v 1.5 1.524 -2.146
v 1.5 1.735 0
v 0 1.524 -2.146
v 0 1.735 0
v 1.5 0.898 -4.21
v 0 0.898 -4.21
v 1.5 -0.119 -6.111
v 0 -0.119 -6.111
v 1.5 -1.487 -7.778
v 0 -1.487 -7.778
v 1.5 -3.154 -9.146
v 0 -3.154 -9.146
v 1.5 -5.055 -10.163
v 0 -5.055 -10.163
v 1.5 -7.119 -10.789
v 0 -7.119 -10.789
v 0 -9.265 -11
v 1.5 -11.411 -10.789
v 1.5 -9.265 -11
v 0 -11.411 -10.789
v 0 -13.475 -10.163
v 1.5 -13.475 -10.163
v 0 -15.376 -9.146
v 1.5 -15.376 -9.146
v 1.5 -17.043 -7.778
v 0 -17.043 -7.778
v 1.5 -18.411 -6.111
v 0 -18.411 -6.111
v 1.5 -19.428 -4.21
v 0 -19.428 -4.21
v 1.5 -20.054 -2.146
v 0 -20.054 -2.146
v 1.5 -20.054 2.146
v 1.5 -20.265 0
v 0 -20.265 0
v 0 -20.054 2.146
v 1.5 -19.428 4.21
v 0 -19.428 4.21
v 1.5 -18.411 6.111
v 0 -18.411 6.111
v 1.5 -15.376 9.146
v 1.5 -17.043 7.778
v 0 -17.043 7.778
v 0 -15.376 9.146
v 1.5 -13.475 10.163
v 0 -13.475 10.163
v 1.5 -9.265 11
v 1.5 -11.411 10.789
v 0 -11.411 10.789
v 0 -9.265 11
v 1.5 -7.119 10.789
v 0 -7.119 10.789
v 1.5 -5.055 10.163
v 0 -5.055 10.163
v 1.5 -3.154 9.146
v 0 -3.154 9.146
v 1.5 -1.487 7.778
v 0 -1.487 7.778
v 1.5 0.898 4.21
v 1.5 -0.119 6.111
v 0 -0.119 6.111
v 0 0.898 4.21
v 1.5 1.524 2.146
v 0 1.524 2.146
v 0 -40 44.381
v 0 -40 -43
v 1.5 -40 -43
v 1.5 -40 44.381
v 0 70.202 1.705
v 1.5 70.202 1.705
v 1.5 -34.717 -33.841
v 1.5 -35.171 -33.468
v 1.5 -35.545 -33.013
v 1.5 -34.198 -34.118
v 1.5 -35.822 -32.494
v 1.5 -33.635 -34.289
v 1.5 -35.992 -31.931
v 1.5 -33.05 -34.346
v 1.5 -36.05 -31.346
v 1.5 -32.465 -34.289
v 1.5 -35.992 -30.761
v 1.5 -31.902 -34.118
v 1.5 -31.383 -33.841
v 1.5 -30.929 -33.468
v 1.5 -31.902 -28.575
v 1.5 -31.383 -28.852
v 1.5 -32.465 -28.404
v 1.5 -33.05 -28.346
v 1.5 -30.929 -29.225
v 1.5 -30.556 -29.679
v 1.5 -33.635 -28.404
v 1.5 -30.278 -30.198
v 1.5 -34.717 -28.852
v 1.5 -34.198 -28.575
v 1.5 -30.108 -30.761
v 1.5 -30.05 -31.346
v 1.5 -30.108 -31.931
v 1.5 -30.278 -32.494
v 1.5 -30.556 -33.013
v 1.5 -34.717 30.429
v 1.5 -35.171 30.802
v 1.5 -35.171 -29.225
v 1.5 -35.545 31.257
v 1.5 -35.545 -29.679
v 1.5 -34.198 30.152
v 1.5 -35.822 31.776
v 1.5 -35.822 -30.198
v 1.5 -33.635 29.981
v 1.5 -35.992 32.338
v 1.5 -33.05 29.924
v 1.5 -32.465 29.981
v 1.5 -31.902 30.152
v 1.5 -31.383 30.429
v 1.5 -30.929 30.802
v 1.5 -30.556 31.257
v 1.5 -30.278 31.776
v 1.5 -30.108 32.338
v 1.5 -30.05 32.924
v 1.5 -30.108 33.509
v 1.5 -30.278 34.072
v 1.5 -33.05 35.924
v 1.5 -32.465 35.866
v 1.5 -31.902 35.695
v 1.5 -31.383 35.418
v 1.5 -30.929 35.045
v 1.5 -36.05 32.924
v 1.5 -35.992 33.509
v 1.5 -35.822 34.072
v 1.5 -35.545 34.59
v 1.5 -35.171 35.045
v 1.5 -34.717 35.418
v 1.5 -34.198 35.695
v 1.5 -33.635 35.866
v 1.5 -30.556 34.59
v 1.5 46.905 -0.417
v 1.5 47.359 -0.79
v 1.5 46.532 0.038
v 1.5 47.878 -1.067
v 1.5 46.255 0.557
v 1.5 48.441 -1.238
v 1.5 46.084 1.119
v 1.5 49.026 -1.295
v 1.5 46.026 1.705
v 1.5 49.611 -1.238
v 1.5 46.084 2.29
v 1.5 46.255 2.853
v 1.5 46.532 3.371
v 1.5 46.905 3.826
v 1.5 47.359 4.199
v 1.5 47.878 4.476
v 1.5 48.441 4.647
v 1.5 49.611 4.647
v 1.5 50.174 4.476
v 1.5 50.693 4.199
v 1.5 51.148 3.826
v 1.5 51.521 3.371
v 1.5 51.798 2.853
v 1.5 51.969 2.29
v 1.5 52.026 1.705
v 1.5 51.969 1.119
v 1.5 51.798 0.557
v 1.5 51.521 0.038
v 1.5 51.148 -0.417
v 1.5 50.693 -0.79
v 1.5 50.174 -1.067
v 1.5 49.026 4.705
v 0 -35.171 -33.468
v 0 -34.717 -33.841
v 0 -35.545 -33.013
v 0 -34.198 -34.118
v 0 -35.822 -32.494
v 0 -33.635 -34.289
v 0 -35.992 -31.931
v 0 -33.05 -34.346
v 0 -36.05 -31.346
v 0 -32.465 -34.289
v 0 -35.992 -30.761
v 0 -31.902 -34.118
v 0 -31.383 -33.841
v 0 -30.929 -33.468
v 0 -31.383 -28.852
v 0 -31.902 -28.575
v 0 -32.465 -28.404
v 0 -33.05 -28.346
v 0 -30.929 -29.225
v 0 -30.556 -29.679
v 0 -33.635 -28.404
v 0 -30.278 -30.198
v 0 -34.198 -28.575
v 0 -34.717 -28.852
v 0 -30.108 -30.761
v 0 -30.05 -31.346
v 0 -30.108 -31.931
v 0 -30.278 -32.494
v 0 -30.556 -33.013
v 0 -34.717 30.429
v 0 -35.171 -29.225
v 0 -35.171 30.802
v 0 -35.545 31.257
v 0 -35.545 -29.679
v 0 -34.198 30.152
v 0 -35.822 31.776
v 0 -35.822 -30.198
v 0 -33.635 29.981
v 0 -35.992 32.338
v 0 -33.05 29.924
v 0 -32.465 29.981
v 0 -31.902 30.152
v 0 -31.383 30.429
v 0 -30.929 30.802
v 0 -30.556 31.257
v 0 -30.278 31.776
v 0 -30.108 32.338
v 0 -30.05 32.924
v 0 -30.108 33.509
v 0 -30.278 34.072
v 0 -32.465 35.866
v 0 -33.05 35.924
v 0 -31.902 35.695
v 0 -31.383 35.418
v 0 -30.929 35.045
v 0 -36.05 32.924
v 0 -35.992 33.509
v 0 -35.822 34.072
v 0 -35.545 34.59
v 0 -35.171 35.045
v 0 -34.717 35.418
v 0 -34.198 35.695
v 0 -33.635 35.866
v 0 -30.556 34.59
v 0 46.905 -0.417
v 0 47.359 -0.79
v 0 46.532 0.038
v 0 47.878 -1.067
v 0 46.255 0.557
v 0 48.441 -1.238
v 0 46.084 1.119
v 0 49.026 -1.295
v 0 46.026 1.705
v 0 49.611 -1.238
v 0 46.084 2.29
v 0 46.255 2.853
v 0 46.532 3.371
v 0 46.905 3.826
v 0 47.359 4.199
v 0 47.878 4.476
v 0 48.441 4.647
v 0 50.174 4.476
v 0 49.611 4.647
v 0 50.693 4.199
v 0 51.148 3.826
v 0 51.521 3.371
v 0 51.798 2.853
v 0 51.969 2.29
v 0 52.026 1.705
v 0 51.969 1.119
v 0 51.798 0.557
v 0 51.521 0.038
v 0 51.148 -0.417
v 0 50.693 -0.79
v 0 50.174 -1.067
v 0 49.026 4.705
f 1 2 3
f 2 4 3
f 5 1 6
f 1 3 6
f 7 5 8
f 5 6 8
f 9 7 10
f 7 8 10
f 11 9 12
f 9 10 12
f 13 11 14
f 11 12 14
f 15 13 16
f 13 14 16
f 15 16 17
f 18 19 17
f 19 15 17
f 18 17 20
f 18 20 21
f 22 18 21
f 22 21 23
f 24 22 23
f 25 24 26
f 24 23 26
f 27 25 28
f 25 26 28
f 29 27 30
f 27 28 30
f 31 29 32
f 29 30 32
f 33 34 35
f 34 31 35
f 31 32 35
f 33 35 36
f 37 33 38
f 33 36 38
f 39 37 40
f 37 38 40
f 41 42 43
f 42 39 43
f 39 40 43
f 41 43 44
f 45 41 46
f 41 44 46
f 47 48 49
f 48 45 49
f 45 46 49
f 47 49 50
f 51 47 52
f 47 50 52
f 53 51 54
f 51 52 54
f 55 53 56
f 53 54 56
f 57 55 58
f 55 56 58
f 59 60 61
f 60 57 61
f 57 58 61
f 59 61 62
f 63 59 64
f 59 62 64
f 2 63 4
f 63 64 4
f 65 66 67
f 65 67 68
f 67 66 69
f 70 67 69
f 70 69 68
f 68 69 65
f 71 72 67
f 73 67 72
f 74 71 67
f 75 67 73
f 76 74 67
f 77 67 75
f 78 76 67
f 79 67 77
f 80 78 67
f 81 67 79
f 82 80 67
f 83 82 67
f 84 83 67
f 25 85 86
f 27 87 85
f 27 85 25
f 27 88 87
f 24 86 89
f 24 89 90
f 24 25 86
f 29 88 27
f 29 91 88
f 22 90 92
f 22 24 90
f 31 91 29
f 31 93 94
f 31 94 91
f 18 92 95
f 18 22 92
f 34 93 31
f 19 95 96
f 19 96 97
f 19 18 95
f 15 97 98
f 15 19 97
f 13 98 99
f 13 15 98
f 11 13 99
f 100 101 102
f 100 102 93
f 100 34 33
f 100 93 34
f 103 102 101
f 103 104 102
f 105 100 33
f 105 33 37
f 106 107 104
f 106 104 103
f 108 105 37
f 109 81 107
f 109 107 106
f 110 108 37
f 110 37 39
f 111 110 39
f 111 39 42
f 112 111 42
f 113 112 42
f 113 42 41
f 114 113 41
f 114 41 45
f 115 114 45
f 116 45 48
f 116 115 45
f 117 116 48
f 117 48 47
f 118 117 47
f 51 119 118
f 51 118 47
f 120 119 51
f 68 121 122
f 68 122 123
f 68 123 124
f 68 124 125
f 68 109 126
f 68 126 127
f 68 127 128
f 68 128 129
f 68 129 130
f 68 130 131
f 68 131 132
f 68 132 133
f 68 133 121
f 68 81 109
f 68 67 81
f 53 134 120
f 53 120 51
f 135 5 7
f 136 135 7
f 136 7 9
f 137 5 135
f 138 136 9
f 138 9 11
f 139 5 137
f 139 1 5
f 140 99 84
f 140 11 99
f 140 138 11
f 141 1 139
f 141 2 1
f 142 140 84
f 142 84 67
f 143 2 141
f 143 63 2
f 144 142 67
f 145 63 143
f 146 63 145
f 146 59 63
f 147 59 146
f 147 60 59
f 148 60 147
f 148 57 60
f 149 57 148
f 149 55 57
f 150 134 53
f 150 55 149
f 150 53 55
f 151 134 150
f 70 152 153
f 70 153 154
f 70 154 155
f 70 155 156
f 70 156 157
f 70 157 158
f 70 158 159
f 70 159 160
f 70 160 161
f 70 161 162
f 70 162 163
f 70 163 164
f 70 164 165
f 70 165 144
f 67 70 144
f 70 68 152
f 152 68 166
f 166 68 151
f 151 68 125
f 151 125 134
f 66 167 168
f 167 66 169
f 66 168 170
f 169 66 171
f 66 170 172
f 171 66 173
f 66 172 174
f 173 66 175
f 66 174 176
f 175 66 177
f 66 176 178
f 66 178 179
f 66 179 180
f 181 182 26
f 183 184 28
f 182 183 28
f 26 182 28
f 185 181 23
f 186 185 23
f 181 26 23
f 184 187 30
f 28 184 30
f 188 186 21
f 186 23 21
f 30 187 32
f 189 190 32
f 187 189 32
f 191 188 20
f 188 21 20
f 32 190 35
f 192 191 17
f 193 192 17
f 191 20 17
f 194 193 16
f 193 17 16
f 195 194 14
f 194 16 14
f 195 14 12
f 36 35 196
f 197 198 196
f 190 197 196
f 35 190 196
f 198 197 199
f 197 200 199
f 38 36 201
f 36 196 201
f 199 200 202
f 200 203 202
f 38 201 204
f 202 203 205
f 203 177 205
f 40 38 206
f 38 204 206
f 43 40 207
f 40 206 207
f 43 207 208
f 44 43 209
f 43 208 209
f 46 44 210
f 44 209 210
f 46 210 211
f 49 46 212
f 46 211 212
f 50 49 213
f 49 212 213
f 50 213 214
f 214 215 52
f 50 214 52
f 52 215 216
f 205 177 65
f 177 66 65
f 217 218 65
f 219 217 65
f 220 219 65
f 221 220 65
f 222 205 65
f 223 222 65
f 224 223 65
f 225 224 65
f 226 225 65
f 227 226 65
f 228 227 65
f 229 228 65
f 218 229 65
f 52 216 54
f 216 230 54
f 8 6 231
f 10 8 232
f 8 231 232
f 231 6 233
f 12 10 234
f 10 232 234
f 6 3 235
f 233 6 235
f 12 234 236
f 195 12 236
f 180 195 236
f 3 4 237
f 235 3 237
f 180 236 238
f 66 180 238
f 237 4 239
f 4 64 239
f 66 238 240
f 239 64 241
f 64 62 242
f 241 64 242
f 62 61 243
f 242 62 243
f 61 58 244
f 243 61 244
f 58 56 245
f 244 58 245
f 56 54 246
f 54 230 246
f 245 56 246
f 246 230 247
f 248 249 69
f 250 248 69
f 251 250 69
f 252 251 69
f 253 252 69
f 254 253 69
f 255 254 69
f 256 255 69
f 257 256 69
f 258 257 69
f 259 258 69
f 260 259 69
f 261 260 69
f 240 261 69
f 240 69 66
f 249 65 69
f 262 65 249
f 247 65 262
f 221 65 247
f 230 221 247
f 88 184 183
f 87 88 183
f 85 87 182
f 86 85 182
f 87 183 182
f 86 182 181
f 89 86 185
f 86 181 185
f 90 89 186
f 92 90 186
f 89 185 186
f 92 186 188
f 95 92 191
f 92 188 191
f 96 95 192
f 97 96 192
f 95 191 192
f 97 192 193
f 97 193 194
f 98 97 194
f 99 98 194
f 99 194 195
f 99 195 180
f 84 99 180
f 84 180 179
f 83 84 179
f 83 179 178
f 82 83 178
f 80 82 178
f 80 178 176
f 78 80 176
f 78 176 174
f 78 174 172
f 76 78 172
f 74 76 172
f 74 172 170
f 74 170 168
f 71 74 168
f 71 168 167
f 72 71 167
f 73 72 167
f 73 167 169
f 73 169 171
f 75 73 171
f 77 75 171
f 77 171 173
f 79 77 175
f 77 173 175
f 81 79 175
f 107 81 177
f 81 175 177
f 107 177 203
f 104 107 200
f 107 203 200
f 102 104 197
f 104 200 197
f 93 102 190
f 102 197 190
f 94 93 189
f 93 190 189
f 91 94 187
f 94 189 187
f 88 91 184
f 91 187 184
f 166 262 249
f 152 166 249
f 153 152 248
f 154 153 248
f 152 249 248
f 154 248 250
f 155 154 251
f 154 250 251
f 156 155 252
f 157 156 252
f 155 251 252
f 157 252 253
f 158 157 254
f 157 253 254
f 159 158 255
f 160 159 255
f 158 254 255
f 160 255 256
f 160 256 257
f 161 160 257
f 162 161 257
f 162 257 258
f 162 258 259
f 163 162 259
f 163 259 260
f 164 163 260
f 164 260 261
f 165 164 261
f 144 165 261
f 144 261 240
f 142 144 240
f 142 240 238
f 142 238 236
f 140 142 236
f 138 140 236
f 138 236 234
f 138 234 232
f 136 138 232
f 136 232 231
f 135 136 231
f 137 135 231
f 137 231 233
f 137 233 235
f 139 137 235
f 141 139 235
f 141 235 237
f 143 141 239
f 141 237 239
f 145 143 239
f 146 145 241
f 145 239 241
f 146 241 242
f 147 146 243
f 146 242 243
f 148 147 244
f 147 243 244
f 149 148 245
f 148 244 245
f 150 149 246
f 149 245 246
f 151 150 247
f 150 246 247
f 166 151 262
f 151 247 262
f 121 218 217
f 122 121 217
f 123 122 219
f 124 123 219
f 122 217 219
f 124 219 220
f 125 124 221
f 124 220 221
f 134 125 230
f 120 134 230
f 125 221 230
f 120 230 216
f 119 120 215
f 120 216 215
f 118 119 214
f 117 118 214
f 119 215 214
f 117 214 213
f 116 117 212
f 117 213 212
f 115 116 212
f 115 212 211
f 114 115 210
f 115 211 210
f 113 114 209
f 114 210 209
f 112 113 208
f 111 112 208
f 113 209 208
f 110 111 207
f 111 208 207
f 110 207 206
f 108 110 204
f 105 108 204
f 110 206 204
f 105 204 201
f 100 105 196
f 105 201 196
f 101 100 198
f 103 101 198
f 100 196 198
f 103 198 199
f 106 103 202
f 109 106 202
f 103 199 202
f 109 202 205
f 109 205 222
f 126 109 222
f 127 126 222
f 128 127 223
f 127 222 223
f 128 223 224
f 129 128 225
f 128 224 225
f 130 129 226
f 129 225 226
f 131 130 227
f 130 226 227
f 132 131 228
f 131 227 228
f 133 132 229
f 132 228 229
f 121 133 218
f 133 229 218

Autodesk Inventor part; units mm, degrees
ref_plane "YZ Plane" through (0, 0, 0) normal (1, 0, 0) x (0, 1, 0)
ref_plane "XZ Plane" through (0, 0, 0) normal (0, 1, 0) x (-1, 0, 0)
ref_plane "XY Plane" through (0, 0, 0) normal (0, 0, 1) x (1, 0, 0)
sketch "Esboço1" plane through (0, 0, 0) normal (1, 0, 0) x (0, 1, 0)
  line L0 (0, 0) -> (0, 43) construction
  line L1 (0, 0) -> (0, -43) construction
  line L2 (0, 0) -> (-40, 0) construction
  line L3 (-40, -43) -> (-40, 44.381)
  line L4 (-40, 0) -> (66, 0) construction
  line L5 (-40, -43) -> (70.202, 1.7046)
  line L6 (70.202, 1.7046) -> (-40, 44.381)
  circle A0 centre (-9.265, 0) radius 11
  line L7 (-326.6157, 155.3746) -> (103.2483, -11.0928)
  dimension "d1" = 43
  dimension "d2" = 43
  dimension "d3" = 40
  dimension "d4" = 106
  dimension "d5" = 22
extrude "Extrusão1" add sketch "Esboço1" along normal blind 1.5
sketch "Esboço2" plane through (0, 0, 0) normal (-1, 0, 0) x (0, 0, 1)
  circle A0 centre (1.7046, 49.0262) radius 3 projected
  circle A1 centre (-31.3462, -33.0501) radius 3 projected
  circle A2 centre (32.9237, -33.0501) radius 3 projected
  point P0 (0, 0)
extrude "Extrusão2" cut sketch "Esboço2" against normal blind 2
sketch "Esboço3" plane through (1.5, 0, 0) normal (1, 0, 0) x (0, 0, -1)
  circle A0 centre (0, -9.265) radius 11 projected
ref_plane "Work Plane1" through (0, 70.202, 1.7046) normal (0, -0.008, 1) x (1, 0, 0)
properties part number "fixação KS traseiro"
